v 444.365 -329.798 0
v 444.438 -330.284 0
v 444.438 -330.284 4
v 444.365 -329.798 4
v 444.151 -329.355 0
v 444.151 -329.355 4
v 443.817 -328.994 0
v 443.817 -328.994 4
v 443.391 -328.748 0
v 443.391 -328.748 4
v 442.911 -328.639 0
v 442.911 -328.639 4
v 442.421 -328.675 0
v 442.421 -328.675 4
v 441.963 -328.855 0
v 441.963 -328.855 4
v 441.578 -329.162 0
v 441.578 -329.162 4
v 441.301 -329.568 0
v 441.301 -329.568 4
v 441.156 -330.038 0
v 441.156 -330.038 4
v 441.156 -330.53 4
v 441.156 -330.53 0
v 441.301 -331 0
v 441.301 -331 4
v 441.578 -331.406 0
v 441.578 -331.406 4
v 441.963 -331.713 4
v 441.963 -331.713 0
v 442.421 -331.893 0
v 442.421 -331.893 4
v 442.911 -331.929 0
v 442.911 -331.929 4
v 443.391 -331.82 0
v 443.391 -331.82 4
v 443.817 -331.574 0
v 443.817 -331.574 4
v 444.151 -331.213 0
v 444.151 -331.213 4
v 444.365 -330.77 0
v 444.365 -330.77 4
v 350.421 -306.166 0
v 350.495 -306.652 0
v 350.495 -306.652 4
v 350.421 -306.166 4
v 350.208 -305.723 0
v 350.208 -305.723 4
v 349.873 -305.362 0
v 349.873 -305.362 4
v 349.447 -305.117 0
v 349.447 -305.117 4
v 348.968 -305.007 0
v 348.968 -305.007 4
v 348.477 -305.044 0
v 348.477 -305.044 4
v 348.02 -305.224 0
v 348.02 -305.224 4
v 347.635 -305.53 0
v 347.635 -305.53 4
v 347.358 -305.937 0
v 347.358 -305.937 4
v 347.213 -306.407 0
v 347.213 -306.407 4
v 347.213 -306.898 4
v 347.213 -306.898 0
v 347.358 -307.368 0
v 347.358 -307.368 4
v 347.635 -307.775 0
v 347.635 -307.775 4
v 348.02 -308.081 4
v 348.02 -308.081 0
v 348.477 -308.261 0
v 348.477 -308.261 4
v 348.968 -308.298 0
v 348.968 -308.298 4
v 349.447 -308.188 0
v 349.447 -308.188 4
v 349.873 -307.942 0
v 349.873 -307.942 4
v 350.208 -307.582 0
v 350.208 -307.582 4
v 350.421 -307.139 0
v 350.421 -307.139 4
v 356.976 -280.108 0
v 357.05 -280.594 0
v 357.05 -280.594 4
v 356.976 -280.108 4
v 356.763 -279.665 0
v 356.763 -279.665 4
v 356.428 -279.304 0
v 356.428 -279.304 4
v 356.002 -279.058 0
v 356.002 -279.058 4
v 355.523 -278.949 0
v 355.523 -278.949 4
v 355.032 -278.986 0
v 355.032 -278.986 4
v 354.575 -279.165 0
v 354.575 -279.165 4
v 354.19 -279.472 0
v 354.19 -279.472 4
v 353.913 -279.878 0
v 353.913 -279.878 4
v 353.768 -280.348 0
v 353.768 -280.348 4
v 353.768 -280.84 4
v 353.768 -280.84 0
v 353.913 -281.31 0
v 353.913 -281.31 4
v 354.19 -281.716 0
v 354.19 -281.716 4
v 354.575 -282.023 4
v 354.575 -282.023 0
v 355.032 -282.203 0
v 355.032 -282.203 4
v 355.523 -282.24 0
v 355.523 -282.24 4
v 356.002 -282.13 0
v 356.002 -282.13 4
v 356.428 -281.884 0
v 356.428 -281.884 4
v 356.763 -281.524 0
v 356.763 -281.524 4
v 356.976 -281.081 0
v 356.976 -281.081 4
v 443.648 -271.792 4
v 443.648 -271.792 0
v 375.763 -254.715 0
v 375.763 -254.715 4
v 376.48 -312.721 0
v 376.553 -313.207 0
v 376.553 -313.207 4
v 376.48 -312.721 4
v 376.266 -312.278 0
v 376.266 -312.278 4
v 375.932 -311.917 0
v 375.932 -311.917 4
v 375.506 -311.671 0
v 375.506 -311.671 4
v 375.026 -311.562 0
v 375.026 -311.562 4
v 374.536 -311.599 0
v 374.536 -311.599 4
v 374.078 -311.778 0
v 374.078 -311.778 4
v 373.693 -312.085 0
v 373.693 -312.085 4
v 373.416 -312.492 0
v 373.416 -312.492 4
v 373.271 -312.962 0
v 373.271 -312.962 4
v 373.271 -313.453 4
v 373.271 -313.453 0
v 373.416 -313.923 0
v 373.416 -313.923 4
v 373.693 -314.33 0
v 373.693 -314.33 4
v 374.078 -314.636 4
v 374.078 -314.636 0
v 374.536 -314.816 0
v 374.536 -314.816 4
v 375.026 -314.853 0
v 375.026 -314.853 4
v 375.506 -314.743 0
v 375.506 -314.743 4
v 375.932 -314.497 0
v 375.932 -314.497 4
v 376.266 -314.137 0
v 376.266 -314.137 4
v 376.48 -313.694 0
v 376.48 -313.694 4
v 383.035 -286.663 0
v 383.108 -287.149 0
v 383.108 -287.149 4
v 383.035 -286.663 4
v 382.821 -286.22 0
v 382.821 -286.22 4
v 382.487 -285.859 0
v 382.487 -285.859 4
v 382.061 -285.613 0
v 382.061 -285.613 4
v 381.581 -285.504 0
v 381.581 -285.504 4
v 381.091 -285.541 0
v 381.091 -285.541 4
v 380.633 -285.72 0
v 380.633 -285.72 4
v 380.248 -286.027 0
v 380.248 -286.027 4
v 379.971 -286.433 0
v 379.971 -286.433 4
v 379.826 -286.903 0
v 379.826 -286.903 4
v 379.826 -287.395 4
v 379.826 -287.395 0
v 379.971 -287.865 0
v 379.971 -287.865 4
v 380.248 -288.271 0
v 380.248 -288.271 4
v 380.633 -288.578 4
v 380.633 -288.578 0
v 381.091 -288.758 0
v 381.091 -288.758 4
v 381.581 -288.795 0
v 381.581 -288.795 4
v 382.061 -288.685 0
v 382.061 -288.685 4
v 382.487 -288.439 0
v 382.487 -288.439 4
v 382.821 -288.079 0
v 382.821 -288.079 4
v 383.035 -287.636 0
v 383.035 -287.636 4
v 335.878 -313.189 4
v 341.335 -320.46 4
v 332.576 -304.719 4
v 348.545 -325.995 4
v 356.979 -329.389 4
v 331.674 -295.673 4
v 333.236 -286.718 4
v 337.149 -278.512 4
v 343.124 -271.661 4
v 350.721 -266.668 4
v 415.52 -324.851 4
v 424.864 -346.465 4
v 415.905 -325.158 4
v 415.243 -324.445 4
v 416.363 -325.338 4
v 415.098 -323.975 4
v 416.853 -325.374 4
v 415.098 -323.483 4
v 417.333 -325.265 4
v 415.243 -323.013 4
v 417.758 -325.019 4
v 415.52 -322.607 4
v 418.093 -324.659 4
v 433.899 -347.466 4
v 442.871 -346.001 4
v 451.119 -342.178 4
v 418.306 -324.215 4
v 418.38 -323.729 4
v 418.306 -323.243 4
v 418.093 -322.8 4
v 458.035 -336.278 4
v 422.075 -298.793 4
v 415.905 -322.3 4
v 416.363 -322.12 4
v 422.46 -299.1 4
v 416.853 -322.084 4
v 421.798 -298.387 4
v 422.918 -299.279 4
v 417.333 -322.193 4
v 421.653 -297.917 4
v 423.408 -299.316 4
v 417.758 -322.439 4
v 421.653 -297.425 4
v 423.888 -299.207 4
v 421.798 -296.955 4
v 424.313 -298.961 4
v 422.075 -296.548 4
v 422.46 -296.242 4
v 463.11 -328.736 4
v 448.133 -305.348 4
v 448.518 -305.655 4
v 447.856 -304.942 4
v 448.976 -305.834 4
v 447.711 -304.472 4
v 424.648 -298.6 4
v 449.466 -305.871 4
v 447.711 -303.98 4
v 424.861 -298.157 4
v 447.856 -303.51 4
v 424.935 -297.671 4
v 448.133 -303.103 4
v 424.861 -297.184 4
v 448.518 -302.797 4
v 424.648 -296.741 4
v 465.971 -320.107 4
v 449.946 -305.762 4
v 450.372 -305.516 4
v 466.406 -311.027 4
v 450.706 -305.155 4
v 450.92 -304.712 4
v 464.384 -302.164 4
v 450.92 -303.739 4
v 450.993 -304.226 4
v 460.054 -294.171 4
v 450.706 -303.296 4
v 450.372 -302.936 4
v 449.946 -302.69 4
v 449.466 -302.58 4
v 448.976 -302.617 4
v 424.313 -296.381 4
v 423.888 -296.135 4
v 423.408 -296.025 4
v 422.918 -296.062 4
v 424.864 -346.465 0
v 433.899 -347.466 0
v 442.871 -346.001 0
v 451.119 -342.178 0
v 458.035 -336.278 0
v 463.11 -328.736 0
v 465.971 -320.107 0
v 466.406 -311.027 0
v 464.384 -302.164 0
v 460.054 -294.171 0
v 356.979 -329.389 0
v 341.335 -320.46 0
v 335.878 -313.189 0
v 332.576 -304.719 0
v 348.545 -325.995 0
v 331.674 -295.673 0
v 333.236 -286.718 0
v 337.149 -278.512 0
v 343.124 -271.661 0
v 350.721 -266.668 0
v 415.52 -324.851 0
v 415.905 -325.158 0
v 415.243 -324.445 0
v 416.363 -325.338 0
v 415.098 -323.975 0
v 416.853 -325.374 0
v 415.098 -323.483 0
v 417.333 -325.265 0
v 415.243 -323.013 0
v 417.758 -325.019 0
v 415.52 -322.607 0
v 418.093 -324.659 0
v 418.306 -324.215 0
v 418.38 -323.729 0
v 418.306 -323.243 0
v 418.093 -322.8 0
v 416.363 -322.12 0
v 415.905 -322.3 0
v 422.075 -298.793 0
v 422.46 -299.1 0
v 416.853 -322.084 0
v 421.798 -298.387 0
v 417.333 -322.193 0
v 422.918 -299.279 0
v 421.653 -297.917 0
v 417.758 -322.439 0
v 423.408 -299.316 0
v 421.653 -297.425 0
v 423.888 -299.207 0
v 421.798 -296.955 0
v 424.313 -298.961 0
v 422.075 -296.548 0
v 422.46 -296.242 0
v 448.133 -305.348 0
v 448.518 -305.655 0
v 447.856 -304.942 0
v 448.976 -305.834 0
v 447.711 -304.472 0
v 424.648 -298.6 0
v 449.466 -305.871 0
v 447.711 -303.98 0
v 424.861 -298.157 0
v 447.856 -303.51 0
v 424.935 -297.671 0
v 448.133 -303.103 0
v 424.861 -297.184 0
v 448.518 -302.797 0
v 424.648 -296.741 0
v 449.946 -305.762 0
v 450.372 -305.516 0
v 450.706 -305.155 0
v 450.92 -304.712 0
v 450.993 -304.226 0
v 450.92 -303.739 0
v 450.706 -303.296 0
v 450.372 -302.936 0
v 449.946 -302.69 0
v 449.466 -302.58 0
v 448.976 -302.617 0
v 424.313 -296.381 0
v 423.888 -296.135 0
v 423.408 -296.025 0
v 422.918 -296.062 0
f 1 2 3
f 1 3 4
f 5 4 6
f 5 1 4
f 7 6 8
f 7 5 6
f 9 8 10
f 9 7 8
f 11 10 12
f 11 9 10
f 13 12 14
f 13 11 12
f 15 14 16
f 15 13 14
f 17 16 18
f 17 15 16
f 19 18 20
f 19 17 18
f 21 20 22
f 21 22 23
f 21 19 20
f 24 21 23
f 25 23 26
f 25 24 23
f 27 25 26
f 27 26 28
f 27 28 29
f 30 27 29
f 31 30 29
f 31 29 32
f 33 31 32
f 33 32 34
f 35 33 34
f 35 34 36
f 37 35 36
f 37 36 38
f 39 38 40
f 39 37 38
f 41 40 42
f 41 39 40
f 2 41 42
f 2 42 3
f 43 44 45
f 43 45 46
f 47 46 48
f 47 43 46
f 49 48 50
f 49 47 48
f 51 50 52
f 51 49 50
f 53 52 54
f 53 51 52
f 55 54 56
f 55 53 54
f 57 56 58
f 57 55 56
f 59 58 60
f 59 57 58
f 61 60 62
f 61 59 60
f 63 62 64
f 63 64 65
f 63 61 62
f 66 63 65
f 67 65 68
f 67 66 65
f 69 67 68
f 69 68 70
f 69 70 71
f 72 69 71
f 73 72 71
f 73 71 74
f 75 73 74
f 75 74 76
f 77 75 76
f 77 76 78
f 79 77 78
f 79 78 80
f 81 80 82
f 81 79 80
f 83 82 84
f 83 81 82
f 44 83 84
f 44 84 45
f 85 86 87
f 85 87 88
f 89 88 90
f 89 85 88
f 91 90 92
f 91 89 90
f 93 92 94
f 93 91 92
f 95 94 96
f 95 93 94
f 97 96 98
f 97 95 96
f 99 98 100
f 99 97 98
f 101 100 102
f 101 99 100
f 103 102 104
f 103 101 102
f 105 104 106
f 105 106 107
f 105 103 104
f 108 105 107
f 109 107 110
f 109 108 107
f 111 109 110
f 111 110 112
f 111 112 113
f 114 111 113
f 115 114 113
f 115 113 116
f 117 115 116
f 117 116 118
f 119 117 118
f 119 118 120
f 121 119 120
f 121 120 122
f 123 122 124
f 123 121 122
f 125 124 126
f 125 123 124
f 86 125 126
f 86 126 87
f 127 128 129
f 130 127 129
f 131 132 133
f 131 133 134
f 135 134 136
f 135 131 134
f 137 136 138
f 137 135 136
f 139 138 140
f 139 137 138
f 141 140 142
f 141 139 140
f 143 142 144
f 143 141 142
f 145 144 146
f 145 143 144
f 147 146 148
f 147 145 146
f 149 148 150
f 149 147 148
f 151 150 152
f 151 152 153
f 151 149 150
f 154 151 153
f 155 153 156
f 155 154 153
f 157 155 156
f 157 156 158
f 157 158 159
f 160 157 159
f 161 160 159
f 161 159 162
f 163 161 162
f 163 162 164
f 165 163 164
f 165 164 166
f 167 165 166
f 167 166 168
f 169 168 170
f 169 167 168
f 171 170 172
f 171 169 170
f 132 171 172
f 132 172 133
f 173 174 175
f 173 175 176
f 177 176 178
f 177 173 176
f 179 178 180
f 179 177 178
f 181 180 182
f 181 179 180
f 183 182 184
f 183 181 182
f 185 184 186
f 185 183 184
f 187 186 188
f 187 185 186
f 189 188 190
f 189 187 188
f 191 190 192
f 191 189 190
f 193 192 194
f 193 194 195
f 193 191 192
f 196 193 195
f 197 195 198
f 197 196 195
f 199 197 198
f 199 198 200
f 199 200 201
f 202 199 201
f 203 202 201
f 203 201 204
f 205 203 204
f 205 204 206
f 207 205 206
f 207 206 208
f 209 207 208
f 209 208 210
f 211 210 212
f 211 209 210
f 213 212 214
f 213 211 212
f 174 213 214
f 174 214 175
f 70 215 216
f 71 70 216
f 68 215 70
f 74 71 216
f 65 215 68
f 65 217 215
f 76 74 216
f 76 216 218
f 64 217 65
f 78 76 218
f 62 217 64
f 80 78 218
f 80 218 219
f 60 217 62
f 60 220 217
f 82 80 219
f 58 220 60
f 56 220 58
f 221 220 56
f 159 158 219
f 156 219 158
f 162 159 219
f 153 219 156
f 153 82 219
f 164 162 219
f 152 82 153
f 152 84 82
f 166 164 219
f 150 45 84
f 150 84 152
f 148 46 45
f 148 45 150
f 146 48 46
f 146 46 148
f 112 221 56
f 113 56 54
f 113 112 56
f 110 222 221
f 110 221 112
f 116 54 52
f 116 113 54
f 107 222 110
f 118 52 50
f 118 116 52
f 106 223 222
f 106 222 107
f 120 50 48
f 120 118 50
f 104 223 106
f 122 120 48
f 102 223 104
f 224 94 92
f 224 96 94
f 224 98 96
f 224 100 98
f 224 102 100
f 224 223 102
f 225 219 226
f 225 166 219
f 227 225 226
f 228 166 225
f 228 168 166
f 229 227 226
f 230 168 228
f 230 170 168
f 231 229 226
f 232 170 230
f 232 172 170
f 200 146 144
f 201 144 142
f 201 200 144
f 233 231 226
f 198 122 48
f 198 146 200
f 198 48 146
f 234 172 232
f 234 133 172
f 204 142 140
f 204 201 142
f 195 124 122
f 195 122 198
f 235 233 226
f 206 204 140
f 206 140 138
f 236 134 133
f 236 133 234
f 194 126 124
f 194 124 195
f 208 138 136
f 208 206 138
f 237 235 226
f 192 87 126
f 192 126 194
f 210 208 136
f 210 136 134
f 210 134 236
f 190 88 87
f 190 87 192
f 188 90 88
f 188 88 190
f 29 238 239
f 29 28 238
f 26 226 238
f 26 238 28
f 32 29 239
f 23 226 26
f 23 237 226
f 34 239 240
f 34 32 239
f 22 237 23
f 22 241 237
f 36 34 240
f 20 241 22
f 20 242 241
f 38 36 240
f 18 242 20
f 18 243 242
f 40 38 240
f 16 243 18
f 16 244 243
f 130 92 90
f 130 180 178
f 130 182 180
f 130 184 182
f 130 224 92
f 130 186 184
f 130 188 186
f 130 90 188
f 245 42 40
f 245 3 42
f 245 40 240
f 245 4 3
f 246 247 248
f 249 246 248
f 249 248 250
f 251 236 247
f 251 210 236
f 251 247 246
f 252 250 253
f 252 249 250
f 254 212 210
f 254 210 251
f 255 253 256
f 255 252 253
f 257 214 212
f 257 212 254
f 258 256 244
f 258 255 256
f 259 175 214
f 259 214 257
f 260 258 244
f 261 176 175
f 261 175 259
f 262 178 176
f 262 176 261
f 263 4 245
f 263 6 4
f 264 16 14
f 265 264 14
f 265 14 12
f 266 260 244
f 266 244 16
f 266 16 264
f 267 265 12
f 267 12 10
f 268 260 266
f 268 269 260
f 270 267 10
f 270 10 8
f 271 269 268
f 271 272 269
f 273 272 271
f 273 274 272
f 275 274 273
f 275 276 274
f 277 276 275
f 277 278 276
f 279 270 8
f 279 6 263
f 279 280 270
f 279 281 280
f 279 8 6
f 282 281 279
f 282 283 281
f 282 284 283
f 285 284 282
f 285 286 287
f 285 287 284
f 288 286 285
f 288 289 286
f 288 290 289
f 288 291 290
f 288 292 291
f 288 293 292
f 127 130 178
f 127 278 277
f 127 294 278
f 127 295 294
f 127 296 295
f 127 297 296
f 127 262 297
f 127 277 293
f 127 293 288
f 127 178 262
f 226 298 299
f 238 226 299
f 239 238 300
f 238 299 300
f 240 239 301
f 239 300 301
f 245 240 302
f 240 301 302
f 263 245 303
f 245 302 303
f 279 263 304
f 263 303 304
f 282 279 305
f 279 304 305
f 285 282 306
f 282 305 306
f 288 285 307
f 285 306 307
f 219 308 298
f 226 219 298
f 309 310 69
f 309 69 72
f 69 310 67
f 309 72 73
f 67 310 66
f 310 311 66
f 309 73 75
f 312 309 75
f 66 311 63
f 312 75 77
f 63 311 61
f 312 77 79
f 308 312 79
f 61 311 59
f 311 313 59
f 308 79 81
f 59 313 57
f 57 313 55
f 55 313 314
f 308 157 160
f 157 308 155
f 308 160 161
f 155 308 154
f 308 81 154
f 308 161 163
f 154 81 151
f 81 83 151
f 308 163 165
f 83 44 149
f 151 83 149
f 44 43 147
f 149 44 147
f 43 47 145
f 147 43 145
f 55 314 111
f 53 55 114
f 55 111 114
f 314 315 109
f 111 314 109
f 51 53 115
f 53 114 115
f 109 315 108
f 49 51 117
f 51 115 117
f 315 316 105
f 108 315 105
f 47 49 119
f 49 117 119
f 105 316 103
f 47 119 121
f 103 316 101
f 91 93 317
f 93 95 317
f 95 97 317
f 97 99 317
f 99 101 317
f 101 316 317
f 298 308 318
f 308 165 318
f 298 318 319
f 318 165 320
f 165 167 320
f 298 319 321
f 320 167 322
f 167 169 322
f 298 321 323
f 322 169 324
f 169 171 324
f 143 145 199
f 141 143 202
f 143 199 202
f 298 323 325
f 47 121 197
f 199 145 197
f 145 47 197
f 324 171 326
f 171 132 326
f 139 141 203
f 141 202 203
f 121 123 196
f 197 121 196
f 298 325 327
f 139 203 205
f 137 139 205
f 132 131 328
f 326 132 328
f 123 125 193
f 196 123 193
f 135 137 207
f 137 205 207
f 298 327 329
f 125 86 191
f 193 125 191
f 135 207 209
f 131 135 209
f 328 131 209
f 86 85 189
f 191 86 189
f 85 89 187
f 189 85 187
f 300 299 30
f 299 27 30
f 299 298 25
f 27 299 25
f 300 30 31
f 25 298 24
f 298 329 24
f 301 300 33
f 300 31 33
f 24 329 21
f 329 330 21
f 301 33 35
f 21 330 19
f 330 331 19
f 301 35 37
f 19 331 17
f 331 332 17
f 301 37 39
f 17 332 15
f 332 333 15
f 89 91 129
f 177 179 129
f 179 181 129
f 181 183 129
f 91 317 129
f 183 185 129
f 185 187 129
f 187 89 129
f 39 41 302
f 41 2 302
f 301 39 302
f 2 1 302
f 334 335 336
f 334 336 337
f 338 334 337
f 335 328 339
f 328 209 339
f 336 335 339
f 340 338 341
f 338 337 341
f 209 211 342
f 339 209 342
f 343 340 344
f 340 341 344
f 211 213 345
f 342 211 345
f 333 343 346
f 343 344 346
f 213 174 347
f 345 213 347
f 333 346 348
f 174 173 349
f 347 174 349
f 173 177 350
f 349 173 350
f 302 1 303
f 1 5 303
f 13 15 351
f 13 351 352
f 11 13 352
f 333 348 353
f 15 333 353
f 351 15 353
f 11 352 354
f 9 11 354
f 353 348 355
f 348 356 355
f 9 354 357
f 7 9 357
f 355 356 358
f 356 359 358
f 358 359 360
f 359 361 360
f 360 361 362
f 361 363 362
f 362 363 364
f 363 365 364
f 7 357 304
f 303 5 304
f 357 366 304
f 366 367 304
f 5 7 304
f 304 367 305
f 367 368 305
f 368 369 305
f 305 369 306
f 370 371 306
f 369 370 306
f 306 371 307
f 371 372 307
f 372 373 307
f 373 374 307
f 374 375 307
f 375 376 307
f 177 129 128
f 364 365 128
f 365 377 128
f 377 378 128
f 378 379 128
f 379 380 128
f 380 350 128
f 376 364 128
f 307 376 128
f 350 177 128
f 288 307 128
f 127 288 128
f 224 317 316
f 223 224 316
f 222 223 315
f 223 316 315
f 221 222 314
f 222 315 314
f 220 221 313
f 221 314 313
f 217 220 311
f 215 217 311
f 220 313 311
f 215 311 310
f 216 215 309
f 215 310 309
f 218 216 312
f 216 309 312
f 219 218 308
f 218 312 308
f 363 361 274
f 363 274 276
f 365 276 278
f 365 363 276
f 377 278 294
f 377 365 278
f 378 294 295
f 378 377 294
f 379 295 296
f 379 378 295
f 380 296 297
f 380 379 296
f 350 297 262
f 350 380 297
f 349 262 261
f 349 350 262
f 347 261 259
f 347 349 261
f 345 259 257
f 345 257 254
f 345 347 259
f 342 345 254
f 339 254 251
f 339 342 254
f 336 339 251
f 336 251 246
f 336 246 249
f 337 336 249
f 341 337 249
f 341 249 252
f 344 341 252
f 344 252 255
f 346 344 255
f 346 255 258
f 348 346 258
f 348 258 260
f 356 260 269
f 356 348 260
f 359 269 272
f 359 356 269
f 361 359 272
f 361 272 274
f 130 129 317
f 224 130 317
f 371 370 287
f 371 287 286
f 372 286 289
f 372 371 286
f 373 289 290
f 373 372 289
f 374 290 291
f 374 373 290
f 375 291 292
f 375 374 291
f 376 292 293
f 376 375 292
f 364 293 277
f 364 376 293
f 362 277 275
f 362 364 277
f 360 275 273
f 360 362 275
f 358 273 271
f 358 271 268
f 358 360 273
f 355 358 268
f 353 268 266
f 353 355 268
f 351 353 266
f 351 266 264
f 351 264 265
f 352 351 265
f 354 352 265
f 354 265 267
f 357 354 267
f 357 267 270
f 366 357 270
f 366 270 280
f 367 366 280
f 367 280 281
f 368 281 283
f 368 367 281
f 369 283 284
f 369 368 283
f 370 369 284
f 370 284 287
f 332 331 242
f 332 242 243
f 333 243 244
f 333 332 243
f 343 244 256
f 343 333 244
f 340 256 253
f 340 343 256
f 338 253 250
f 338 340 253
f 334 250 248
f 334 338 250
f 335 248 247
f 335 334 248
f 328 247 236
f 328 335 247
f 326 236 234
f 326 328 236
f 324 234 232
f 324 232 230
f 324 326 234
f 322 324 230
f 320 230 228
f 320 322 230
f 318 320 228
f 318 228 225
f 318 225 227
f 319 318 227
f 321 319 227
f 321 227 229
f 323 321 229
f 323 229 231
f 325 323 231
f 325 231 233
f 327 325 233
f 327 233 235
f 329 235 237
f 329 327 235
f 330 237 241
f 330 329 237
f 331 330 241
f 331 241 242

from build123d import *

# Parameters (mm, degrees)
SKETCH_1_R      = 1.65
EXTRUDE_1_DEPTH = 4


with BuildPart() as part:
    # 草图1 → 凸台-拉伸1 (new body)
    with BuildSketch(Plane.XY):
        with BuildLine():
            Line((356.978840025, -329.388705272), (424.86396809, -346.465279506))
            ThreePointArc((424.86396809, -346.465279506), (460.82942454, -332.680172491), (460.054173141, -294.171183692))
            Line((460.054173141, -294.171183692), (443.648199748, -271.791638634))
            Line((443.648199748, -271.791638634), (375.763071682, -254.7150644))
            Line((375.763071682, -254.7150644), (350.72066994, -266.668227789))
            ThreePointArc((350.72066994, -266.668227789), (331.816725216, -300.226894433), (356.978840025, -329.388705272))
        make_face()
        with Locations((355.399566463, -280.594209399)):
            Circle(SKETCH_1_R, mode=Mode.SUBTRACT)
        with Locations((381.457813707, -287.149188467)):
            Circle(SKETCH_1_R, mode=Mode.SUBTRACT)
        with Locations((348.844587395, -306.652456643)):
            Circle(SKETCH_1_R, mode=Mode.SUBTRACT)
        with Locations((374.902834639, -313.207435711)):
            Circle(SKETCH_1_R, mode=Mode.SUBTRACT)
        with Locations((423.284694528, -297.670783633)):
            Circle(SKETCH_1_R, mode=Mode.SUBTRACT)
        with Locations((449.342941772, -304.225762701)):
            Circle(SKETCH_1_R, mode=Mode.SUBTRACT)
        with Locations((416.729715461, -323.729030877)):
            Circle(SKETCH_1_R, mode=Mode.SUBTRACT)
        with Locations((442.787962705, -330.284009945)):
            Circle(SKETCH_1_R, mode=Mode.SUBTRACT)
    extrude(amount=EXTRUDE_1_DEPTH)


solid = part.part
